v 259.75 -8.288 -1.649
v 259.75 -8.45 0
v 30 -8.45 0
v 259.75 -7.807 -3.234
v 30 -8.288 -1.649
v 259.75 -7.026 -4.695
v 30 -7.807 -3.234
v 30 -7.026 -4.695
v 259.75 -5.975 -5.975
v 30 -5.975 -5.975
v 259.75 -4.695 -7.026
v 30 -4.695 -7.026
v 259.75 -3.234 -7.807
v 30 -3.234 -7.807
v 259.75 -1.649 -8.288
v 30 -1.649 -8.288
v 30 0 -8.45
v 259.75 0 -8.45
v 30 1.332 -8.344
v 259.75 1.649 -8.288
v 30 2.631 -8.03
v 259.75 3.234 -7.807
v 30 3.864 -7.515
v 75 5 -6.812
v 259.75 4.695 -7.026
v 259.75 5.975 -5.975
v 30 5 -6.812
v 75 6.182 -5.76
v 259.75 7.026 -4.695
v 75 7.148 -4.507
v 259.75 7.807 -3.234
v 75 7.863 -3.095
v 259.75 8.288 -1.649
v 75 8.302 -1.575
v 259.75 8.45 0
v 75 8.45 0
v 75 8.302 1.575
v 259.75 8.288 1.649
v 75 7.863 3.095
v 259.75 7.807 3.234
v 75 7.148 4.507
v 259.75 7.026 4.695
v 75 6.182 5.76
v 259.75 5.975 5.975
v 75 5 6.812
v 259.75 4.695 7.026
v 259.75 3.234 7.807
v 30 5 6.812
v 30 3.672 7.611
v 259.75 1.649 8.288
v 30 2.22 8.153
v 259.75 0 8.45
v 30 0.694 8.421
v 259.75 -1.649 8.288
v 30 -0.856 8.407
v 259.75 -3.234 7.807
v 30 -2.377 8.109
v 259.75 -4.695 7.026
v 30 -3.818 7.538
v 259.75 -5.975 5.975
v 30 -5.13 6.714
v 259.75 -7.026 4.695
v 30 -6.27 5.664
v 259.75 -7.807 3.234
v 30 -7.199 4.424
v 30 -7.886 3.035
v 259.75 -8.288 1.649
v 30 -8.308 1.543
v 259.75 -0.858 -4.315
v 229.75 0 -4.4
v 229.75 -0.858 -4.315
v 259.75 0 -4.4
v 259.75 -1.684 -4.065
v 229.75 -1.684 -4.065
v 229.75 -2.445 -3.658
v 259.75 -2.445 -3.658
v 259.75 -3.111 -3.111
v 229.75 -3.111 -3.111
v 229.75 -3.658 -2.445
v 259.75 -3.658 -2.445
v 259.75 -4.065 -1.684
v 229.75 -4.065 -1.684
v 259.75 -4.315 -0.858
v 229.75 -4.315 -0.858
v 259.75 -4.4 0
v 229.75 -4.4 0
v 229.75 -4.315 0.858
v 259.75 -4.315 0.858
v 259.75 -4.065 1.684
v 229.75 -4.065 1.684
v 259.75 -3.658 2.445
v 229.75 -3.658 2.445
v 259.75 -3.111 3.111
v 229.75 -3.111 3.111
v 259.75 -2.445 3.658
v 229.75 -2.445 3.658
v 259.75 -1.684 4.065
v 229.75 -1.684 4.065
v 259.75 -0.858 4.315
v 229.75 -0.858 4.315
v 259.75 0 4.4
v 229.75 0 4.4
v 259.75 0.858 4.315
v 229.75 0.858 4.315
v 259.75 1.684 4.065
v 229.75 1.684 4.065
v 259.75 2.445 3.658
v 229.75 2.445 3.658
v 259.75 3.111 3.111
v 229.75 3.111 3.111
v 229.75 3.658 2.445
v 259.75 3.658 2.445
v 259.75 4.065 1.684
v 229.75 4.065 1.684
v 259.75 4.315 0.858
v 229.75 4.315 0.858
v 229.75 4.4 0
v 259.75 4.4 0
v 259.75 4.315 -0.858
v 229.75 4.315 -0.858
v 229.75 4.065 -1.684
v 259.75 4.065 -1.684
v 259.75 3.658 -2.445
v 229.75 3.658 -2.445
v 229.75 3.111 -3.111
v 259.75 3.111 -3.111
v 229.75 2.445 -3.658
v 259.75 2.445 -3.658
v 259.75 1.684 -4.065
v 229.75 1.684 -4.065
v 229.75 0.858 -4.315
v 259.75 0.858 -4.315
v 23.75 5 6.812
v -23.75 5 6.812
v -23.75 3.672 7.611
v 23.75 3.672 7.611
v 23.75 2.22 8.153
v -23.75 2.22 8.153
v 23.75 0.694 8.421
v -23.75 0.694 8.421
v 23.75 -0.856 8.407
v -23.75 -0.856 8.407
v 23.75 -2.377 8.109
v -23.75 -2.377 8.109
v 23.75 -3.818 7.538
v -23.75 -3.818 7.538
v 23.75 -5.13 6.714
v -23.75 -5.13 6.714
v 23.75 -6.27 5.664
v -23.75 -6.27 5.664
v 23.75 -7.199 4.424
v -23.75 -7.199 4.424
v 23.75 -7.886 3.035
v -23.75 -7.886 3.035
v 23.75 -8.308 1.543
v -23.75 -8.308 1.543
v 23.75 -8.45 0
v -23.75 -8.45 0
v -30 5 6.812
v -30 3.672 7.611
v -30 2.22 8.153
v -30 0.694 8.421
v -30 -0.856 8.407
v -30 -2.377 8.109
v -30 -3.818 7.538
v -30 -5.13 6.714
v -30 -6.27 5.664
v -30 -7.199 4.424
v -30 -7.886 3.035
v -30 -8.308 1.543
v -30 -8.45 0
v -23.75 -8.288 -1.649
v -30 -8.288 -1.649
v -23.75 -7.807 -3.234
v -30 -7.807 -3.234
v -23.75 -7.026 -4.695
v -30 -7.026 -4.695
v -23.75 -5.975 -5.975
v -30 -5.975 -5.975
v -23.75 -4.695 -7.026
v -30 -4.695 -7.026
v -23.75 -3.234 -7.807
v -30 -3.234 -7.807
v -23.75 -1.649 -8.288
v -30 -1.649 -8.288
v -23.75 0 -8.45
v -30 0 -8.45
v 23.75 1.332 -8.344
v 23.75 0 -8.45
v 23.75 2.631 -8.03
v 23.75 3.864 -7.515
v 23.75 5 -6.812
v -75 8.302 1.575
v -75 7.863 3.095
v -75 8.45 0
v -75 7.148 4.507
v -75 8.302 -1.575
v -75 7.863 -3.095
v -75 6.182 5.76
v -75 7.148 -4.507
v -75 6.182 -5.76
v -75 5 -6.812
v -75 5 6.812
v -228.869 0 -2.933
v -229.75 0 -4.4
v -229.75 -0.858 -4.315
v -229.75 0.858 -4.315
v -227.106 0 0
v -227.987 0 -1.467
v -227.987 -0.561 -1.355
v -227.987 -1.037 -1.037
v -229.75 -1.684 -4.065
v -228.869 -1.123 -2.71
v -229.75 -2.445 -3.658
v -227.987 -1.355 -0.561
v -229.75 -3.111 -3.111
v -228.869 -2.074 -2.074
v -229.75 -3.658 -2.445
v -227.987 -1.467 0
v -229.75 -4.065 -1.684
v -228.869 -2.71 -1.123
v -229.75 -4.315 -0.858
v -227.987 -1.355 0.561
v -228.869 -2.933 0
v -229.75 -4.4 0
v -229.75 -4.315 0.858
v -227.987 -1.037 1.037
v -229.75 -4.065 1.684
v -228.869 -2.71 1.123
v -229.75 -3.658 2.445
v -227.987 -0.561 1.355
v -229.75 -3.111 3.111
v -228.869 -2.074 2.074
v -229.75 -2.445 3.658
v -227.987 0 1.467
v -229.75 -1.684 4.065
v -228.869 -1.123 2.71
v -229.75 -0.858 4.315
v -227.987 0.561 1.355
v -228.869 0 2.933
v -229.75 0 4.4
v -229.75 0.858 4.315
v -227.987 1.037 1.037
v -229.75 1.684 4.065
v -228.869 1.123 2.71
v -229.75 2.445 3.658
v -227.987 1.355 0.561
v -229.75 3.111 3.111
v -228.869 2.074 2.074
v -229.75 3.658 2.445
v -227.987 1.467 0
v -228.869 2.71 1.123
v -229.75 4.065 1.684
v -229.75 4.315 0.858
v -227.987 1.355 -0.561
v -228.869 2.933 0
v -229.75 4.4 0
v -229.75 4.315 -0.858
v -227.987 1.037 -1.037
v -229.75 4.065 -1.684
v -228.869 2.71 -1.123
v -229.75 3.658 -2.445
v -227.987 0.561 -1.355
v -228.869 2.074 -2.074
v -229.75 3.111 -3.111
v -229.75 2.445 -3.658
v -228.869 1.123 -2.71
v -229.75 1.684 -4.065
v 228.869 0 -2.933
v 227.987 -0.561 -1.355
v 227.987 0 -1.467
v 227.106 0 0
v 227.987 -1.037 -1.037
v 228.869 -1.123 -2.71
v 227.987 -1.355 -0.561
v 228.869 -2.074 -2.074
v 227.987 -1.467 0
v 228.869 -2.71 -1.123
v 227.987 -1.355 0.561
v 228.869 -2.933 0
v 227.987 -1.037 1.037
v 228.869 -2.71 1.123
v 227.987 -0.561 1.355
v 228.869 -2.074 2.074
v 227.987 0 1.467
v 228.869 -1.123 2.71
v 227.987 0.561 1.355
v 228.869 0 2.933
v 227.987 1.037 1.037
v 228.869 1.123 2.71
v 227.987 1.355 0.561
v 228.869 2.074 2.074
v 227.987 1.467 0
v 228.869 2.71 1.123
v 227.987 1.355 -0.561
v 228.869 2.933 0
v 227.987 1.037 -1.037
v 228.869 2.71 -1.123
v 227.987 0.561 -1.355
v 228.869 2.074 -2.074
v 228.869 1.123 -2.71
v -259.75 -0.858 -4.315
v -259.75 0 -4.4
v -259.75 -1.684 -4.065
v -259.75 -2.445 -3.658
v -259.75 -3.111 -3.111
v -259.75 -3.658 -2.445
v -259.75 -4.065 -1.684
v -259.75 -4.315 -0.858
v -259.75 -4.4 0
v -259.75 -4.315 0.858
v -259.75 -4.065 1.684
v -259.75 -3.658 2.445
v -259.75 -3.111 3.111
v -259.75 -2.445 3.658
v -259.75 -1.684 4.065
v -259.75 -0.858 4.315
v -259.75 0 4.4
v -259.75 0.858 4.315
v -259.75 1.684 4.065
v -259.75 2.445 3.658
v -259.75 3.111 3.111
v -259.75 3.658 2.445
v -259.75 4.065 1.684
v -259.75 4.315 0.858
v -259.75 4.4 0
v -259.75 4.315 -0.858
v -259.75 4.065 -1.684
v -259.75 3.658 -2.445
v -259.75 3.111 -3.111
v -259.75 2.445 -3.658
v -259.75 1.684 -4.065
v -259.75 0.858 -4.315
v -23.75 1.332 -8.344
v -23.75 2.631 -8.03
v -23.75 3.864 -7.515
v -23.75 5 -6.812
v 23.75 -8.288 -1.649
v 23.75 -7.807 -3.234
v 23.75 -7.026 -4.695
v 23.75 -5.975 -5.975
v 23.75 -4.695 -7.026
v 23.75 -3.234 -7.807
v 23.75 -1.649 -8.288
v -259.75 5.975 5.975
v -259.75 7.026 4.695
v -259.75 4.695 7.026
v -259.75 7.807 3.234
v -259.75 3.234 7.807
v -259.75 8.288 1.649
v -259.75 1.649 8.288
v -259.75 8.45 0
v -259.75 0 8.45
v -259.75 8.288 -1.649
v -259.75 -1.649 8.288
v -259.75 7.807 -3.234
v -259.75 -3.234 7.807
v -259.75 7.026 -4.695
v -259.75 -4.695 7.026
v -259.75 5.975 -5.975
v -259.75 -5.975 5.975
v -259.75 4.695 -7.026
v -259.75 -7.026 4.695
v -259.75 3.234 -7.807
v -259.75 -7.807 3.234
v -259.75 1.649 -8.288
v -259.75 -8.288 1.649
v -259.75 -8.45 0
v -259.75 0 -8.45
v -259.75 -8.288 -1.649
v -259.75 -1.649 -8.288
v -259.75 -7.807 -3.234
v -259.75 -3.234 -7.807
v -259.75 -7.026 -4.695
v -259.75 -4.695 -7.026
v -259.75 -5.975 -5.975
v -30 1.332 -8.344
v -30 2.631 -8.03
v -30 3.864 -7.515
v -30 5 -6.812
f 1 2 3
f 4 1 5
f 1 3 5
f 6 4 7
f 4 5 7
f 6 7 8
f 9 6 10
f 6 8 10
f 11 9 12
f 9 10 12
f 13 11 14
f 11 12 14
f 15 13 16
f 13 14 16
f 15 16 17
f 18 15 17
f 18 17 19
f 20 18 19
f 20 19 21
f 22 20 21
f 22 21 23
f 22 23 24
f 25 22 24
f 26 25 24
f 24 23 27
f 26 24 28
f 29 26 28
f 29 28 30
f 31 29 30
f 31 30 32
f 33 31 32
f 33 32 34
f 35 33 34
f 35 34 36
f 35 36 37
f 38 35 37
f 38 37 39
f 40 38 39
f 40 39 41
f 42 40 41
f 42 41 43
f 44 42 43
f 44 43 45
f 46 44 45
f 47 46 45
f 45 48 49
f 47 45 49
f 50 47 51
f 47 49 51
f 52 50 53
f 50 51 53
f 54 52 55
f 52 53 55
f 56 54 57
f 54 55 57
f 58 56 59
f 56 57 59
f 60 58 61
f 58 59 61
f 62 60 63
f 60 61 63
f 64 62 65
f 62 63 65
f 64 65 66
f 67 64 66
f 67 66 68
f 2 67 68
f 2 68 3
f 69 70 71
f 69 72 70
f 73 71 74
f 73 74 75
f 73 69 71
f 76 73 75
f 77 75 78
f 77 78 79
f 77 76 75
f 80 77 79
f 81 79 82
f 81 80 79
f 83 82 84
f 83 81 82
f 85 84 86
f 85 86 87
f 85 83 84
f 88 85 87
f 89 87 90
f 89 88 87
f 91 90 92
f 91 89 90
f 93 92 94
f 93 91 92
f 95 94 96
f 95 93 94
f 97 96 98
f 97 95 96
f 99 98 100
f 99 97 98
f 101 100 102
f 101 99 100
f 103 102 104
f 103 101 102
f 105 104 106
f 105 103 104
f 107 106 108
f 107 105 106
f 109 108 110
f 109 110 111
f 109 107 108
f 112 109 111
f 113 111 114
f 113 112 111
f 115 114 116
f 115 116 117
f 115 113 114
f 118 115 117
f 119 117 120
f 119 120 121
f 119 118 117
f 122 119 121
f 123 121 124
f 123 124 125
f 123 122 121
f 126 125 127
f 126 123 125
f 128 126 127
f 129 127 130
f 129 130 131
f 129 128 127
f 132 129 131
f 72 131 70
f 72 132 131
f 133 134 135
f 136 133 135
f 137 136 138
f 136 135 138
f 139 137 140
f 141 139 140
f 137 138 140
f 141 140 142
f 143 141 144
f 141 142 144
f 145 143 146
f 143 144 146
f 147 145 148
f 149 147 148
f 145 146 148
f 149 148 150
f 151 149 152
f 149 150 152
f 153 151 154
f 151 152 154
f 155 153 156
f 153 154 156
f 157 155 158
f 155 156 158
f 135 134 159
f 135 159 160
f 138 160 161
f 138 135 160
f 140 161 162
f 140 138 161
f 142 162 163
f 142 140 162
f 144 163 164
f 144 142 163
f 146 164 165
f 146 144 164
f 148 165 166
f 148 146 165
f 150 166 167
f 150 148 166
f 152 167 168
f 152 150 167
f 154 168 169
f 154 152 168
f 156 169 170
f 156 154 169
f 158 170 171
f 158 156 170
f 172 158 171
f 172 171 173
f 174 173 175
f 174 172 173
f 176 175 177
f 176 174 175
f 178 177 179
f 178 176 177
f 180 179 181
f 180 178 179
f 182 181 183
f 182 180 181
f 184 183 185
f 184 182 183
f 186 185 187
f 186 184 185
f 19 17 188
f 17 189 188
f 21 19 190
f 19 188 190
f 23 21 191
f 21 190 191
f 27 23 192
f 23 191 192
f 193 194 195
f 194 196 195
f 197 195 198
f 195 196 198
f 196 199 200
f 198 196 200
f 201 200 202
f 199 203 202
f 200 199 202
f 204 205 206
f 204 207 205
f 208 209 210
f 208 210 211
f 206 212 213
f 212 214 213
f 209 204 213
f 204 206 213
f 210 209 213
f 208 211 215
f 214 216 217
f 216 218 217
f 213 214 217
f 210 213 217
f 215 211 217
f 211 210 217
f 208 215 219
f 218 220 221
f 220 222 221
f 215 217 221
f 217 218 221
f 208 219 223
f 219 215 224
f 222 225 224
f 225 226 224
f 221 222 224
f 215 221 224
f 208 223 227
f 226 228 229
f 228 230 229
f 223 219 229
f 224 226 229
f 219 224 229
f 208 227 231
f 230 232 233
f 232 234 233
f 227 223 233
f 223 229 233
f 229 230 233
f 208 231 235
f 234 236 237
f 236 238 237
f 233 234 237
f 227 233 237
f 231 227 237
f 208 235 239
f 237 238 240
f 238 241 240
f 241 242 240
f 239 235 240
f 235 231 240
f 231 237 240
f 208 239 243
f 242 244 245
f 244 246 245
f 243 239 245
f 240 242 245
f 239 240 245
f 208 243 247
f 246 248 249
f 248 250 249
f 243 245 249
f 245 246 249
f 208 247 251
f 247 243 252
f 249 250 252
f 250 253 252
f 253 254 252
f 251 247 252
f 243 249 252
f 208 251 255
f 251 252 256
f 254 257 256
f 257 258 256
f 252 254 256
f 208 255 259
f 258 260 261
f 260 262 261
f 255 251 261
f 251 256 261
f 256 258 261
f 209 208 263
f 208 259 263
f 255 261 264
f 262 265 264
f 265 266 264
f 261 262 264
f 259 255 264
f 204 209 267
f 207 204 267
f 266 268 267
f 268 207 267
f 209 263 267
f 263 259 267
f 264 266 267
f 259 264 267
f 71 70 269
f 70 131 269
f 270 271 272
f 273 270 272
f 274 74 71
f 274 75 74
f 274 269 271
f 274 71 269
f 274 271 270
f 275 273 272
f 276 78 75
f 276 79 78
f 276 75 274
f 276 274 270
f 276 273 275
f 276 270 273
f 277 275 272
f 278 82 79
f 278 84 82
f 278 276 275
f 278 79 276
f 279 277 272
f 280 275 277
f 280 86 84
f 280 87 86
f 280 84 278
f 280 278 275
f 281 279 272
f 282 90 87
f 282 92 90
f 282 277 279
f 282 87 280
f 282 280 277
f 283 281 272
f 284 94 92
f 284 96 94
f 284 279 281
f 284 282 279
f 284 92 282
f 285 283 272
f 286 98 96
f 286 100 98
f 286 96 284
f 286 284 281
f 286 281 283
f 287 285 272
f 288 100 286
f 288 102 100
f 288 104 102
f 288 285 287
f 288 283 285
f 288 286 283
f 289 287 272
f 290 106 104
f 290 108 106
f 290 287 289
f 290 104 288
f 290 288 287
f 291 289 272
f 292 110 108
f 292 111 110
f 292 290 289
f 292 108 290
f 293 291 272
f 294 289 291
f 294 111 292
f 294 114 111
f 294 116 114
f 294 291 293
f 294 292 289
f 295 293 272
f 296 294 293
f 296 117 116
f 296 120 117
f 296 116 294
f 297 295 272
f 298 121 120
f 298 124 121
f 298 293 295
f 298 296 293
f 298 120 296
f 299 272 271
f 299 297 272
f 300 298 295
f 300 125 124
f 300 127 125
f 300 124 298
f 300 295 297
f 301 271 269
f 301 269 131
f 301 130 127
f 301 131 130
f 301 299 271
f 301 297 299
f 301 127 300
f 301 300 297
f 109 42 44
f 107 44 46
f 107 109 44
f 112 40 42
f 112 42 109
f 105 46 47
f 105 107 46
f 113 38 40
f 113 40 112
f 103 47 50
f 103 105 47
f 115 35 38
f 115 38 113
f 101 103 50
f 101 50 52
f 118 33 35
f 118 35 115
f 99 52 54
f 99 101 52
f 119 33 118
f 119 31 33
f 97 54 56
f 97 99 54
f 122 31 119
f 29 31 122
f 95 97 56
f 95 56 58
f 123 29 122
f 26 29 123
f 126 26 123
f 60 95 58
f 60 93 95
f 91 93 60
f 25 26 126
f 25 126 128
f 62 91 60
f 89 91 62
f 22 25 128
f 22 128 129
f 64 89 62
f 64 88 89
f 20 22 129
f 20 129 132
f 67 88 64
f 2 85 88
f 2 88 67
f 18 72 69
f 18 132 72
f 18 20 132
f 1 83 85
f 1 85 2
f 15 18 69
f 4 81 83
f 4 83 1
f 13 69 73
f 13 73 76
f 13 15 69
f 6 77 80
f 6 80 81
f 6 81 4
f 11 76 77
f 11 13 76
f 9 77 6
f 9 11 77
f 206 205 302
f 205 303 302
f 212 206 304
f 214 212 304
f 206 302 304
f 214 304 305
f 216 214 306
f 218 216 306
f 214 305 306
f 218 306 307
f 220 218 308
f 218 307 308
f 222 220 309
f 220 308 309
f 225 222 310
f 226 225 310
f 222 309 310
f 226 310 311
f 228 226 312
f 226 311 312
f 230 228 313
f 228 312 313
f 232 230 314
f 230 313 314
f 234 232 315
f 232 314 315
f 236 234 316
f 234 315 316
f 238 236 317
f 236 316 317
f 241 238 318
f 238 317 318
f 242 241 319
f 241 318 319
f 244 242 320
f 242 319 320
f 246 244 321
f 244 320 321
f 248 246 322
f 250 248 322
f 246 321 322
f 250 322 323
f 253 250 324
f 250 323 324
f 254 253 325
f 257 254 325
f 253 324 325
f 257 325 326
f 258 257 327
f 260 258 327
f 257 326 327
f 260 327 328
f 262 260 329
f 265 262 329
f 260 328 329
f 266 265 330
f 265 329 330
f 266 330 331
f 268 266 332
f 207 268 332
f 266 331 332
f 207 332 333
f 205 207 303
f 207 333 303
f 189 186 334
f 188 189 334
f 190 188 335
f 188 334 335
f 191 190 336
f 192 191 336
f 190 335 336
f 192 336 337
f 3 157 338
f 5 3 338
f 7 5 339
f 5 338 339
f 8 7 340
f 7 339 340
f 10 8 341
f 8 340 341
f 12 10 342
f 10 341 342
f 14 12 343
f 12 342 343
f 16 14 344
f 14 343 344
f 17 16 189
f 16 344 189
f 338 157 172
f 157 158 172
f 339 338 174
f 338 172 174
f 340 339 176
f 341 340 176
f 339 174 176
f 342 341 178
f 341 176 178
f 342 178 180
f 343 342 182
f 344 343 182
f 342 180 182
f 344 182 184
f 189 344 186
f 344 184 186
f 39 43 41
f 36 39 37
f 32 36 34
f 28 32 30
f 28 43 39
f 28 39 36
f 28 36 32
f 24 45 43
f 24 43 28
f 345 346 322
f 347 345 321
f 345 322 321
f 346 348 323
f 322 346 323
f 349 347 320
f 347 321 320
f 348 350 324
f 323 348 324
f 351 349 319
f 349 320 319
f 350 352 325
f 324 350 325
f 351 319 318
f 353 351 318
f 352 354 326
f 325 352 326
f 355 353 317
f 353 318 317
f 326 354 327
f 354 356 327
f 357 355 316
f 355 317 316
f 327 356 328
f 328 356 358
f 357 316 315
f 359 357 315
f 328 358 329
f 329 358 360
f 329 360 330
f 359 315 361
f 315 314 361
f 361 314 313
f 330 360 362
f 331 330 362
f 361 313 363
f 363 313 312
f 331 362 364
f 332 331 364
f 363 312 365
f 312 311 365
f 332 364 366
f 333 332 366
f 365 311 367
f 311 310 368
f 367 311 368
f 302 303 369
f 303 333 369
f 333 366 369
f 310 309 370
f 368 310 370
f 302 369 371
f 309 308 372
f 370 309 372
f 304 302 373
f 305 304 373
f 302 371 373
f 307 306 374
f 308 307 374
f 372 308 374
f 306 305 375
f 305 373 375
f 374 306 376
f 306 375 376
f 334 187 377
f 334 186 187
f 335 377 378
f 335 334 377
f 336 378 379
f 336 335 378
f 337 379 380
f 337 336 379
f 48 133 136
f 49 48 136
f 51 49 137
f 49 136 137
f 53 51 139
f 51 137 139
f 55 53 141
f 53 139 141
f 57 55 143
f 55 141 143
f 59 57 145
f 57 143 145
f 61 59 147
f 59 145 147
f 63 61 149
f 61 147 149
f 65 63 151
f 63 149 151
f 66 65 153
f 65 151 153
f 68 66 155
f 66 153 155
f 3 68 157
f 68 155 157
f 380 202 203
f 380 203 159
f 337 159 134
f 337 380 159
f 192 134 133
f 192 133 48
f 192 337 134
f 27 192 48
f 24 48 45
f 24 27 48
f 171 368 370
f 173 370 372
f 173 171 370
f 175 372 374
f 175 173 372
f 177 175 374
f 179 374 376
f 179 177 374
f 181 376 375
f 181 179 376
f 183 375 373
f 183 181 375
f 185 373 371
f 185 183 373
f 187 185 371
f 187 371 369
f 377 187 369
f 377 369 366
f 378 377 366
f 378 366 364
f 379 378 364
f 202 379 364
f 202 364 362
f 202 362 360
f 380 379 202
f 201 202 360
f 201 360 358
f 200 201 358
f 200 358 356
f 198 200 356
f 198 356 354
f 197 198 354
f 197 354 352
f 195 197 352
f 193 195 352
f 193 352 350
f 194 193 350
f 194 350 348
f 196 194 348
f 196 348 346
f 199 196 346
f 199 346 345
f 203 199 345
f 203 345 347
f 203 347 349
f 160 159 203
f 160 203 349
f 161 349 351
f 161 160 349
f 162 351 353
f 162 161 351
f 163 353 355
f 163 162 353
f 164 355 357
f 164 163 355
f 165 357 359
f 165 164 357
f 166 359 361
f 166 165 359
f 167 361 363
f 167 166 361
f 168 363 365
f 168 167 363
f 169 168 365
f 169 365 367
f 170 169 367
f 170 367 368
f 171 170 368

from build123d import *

# Parameters (mm, degrees)
SKETCH1_W               = 20
SKETCH1_H               = 16.9
BOSS_EXTRUDE1_DEPTH     = 23.75
SKETCH2_R               = 8.45
BOSS_EXTRUDE2_DEPTH     = 236
SKETCH6_R               = 18.45
SKETCH6_R_2             = 8.45
CUT_EXTRUDE_THIN1_DEPTH = 30
CUT_EXTRUDE1_START      = 5
SKETCH7_W               = 150
SKETCH7_H               = 40
CUT_EXTRUDE1_DEPTH      = 10


with BuildPart() as part:
    # Sketch1 → Boss-Extrude1 (new, symmetric)
    with BuildSketch(Plane(origin=(0, 0, 0), x_dir=(0, 0, -1), z_dir=(1, 0, 0))):
        Rectangle(SKETCH1_W, SKETCH1_H)
    extrude(amount=BOSS_EXTRUDE1_DEPTH, both=True)

    # Sketch2 → Boss-Extrude2 (add)
    with BuildSketch(Plane(origin=(23.75, 0, 0), x_dir=(0, 0, -1), z_dir=(1, 0, 0))):
        with Locations(Location((0, 0, 0), (0, 0, 270))):
            Circle(SKETCH2_R)
    boss_extrude2 = extrude(amount=BOSS_EXTRUDE2_DEPTH)

    # Sketch3 → M10x1.25 Tapped Hole1 (revolve, cut)
    with BuildSketch(Plane(origin=(259.75, 0, 0), x_dir=(0, 0, -1), z_dir=(0, 1, 0))):
        Polygon((0, 0), (0, 32.643786724), (4.4, 30), (4.4, 0), align=None)
    m10x1_25_tapped_hole1 = revolve(axis=Axis((266.1, 0, 0), (-1, 0, 0)), mode=Mode.SUBTRACT)

    # Mirror1: Boss-Extrude2, M10x1.25 Tapped Hole1 across plane
    add(boss_extrude2.mirror(Plane(origin=(0, 0, 0), x_dir=(0, 0, 1), z_dir=(1, 0, 0))))
    add(m10x1_25_tapped_hole1.mirror(Plane(origin=(0, 0, 0), x_dir=(0, 0, 1), z_dir=(1, 0, 0))), mode=Mode.SUBTRACT)

    # Sketch6 → Cut-Extrude-Thin1 (cut, symmetric)
    with BuildSketch(Plane(origin=(0, 0, 0), x_dir=(0, 0, -1), z_dir=(1, 0, 0))):
        Circle(SKETCH6_R)
        Circle(SKETCH6_R_2, mode=Mode.SUBTRACT)
    extrude(amount=CUT_EXTRUDE_THIN1_DEPTH, both=True, mode=Mode.SUBTRACT)

    # Sketch7 → Cut-Extrude1 (cut)
    with BuildSketch(Plane(origin=(0, 0, 0), x_dir=(1, 0, 0), z_dir=(0, 1, 0)).offset(CUT_EXTRUDE1_START)):
        Rectangle(SKETCH7_W, SKETCH7_H)
    extrude(amount=CUT_EXTRUDE1_DEPTH, mode=Mode.SUBTRACT)


solid = part.part
